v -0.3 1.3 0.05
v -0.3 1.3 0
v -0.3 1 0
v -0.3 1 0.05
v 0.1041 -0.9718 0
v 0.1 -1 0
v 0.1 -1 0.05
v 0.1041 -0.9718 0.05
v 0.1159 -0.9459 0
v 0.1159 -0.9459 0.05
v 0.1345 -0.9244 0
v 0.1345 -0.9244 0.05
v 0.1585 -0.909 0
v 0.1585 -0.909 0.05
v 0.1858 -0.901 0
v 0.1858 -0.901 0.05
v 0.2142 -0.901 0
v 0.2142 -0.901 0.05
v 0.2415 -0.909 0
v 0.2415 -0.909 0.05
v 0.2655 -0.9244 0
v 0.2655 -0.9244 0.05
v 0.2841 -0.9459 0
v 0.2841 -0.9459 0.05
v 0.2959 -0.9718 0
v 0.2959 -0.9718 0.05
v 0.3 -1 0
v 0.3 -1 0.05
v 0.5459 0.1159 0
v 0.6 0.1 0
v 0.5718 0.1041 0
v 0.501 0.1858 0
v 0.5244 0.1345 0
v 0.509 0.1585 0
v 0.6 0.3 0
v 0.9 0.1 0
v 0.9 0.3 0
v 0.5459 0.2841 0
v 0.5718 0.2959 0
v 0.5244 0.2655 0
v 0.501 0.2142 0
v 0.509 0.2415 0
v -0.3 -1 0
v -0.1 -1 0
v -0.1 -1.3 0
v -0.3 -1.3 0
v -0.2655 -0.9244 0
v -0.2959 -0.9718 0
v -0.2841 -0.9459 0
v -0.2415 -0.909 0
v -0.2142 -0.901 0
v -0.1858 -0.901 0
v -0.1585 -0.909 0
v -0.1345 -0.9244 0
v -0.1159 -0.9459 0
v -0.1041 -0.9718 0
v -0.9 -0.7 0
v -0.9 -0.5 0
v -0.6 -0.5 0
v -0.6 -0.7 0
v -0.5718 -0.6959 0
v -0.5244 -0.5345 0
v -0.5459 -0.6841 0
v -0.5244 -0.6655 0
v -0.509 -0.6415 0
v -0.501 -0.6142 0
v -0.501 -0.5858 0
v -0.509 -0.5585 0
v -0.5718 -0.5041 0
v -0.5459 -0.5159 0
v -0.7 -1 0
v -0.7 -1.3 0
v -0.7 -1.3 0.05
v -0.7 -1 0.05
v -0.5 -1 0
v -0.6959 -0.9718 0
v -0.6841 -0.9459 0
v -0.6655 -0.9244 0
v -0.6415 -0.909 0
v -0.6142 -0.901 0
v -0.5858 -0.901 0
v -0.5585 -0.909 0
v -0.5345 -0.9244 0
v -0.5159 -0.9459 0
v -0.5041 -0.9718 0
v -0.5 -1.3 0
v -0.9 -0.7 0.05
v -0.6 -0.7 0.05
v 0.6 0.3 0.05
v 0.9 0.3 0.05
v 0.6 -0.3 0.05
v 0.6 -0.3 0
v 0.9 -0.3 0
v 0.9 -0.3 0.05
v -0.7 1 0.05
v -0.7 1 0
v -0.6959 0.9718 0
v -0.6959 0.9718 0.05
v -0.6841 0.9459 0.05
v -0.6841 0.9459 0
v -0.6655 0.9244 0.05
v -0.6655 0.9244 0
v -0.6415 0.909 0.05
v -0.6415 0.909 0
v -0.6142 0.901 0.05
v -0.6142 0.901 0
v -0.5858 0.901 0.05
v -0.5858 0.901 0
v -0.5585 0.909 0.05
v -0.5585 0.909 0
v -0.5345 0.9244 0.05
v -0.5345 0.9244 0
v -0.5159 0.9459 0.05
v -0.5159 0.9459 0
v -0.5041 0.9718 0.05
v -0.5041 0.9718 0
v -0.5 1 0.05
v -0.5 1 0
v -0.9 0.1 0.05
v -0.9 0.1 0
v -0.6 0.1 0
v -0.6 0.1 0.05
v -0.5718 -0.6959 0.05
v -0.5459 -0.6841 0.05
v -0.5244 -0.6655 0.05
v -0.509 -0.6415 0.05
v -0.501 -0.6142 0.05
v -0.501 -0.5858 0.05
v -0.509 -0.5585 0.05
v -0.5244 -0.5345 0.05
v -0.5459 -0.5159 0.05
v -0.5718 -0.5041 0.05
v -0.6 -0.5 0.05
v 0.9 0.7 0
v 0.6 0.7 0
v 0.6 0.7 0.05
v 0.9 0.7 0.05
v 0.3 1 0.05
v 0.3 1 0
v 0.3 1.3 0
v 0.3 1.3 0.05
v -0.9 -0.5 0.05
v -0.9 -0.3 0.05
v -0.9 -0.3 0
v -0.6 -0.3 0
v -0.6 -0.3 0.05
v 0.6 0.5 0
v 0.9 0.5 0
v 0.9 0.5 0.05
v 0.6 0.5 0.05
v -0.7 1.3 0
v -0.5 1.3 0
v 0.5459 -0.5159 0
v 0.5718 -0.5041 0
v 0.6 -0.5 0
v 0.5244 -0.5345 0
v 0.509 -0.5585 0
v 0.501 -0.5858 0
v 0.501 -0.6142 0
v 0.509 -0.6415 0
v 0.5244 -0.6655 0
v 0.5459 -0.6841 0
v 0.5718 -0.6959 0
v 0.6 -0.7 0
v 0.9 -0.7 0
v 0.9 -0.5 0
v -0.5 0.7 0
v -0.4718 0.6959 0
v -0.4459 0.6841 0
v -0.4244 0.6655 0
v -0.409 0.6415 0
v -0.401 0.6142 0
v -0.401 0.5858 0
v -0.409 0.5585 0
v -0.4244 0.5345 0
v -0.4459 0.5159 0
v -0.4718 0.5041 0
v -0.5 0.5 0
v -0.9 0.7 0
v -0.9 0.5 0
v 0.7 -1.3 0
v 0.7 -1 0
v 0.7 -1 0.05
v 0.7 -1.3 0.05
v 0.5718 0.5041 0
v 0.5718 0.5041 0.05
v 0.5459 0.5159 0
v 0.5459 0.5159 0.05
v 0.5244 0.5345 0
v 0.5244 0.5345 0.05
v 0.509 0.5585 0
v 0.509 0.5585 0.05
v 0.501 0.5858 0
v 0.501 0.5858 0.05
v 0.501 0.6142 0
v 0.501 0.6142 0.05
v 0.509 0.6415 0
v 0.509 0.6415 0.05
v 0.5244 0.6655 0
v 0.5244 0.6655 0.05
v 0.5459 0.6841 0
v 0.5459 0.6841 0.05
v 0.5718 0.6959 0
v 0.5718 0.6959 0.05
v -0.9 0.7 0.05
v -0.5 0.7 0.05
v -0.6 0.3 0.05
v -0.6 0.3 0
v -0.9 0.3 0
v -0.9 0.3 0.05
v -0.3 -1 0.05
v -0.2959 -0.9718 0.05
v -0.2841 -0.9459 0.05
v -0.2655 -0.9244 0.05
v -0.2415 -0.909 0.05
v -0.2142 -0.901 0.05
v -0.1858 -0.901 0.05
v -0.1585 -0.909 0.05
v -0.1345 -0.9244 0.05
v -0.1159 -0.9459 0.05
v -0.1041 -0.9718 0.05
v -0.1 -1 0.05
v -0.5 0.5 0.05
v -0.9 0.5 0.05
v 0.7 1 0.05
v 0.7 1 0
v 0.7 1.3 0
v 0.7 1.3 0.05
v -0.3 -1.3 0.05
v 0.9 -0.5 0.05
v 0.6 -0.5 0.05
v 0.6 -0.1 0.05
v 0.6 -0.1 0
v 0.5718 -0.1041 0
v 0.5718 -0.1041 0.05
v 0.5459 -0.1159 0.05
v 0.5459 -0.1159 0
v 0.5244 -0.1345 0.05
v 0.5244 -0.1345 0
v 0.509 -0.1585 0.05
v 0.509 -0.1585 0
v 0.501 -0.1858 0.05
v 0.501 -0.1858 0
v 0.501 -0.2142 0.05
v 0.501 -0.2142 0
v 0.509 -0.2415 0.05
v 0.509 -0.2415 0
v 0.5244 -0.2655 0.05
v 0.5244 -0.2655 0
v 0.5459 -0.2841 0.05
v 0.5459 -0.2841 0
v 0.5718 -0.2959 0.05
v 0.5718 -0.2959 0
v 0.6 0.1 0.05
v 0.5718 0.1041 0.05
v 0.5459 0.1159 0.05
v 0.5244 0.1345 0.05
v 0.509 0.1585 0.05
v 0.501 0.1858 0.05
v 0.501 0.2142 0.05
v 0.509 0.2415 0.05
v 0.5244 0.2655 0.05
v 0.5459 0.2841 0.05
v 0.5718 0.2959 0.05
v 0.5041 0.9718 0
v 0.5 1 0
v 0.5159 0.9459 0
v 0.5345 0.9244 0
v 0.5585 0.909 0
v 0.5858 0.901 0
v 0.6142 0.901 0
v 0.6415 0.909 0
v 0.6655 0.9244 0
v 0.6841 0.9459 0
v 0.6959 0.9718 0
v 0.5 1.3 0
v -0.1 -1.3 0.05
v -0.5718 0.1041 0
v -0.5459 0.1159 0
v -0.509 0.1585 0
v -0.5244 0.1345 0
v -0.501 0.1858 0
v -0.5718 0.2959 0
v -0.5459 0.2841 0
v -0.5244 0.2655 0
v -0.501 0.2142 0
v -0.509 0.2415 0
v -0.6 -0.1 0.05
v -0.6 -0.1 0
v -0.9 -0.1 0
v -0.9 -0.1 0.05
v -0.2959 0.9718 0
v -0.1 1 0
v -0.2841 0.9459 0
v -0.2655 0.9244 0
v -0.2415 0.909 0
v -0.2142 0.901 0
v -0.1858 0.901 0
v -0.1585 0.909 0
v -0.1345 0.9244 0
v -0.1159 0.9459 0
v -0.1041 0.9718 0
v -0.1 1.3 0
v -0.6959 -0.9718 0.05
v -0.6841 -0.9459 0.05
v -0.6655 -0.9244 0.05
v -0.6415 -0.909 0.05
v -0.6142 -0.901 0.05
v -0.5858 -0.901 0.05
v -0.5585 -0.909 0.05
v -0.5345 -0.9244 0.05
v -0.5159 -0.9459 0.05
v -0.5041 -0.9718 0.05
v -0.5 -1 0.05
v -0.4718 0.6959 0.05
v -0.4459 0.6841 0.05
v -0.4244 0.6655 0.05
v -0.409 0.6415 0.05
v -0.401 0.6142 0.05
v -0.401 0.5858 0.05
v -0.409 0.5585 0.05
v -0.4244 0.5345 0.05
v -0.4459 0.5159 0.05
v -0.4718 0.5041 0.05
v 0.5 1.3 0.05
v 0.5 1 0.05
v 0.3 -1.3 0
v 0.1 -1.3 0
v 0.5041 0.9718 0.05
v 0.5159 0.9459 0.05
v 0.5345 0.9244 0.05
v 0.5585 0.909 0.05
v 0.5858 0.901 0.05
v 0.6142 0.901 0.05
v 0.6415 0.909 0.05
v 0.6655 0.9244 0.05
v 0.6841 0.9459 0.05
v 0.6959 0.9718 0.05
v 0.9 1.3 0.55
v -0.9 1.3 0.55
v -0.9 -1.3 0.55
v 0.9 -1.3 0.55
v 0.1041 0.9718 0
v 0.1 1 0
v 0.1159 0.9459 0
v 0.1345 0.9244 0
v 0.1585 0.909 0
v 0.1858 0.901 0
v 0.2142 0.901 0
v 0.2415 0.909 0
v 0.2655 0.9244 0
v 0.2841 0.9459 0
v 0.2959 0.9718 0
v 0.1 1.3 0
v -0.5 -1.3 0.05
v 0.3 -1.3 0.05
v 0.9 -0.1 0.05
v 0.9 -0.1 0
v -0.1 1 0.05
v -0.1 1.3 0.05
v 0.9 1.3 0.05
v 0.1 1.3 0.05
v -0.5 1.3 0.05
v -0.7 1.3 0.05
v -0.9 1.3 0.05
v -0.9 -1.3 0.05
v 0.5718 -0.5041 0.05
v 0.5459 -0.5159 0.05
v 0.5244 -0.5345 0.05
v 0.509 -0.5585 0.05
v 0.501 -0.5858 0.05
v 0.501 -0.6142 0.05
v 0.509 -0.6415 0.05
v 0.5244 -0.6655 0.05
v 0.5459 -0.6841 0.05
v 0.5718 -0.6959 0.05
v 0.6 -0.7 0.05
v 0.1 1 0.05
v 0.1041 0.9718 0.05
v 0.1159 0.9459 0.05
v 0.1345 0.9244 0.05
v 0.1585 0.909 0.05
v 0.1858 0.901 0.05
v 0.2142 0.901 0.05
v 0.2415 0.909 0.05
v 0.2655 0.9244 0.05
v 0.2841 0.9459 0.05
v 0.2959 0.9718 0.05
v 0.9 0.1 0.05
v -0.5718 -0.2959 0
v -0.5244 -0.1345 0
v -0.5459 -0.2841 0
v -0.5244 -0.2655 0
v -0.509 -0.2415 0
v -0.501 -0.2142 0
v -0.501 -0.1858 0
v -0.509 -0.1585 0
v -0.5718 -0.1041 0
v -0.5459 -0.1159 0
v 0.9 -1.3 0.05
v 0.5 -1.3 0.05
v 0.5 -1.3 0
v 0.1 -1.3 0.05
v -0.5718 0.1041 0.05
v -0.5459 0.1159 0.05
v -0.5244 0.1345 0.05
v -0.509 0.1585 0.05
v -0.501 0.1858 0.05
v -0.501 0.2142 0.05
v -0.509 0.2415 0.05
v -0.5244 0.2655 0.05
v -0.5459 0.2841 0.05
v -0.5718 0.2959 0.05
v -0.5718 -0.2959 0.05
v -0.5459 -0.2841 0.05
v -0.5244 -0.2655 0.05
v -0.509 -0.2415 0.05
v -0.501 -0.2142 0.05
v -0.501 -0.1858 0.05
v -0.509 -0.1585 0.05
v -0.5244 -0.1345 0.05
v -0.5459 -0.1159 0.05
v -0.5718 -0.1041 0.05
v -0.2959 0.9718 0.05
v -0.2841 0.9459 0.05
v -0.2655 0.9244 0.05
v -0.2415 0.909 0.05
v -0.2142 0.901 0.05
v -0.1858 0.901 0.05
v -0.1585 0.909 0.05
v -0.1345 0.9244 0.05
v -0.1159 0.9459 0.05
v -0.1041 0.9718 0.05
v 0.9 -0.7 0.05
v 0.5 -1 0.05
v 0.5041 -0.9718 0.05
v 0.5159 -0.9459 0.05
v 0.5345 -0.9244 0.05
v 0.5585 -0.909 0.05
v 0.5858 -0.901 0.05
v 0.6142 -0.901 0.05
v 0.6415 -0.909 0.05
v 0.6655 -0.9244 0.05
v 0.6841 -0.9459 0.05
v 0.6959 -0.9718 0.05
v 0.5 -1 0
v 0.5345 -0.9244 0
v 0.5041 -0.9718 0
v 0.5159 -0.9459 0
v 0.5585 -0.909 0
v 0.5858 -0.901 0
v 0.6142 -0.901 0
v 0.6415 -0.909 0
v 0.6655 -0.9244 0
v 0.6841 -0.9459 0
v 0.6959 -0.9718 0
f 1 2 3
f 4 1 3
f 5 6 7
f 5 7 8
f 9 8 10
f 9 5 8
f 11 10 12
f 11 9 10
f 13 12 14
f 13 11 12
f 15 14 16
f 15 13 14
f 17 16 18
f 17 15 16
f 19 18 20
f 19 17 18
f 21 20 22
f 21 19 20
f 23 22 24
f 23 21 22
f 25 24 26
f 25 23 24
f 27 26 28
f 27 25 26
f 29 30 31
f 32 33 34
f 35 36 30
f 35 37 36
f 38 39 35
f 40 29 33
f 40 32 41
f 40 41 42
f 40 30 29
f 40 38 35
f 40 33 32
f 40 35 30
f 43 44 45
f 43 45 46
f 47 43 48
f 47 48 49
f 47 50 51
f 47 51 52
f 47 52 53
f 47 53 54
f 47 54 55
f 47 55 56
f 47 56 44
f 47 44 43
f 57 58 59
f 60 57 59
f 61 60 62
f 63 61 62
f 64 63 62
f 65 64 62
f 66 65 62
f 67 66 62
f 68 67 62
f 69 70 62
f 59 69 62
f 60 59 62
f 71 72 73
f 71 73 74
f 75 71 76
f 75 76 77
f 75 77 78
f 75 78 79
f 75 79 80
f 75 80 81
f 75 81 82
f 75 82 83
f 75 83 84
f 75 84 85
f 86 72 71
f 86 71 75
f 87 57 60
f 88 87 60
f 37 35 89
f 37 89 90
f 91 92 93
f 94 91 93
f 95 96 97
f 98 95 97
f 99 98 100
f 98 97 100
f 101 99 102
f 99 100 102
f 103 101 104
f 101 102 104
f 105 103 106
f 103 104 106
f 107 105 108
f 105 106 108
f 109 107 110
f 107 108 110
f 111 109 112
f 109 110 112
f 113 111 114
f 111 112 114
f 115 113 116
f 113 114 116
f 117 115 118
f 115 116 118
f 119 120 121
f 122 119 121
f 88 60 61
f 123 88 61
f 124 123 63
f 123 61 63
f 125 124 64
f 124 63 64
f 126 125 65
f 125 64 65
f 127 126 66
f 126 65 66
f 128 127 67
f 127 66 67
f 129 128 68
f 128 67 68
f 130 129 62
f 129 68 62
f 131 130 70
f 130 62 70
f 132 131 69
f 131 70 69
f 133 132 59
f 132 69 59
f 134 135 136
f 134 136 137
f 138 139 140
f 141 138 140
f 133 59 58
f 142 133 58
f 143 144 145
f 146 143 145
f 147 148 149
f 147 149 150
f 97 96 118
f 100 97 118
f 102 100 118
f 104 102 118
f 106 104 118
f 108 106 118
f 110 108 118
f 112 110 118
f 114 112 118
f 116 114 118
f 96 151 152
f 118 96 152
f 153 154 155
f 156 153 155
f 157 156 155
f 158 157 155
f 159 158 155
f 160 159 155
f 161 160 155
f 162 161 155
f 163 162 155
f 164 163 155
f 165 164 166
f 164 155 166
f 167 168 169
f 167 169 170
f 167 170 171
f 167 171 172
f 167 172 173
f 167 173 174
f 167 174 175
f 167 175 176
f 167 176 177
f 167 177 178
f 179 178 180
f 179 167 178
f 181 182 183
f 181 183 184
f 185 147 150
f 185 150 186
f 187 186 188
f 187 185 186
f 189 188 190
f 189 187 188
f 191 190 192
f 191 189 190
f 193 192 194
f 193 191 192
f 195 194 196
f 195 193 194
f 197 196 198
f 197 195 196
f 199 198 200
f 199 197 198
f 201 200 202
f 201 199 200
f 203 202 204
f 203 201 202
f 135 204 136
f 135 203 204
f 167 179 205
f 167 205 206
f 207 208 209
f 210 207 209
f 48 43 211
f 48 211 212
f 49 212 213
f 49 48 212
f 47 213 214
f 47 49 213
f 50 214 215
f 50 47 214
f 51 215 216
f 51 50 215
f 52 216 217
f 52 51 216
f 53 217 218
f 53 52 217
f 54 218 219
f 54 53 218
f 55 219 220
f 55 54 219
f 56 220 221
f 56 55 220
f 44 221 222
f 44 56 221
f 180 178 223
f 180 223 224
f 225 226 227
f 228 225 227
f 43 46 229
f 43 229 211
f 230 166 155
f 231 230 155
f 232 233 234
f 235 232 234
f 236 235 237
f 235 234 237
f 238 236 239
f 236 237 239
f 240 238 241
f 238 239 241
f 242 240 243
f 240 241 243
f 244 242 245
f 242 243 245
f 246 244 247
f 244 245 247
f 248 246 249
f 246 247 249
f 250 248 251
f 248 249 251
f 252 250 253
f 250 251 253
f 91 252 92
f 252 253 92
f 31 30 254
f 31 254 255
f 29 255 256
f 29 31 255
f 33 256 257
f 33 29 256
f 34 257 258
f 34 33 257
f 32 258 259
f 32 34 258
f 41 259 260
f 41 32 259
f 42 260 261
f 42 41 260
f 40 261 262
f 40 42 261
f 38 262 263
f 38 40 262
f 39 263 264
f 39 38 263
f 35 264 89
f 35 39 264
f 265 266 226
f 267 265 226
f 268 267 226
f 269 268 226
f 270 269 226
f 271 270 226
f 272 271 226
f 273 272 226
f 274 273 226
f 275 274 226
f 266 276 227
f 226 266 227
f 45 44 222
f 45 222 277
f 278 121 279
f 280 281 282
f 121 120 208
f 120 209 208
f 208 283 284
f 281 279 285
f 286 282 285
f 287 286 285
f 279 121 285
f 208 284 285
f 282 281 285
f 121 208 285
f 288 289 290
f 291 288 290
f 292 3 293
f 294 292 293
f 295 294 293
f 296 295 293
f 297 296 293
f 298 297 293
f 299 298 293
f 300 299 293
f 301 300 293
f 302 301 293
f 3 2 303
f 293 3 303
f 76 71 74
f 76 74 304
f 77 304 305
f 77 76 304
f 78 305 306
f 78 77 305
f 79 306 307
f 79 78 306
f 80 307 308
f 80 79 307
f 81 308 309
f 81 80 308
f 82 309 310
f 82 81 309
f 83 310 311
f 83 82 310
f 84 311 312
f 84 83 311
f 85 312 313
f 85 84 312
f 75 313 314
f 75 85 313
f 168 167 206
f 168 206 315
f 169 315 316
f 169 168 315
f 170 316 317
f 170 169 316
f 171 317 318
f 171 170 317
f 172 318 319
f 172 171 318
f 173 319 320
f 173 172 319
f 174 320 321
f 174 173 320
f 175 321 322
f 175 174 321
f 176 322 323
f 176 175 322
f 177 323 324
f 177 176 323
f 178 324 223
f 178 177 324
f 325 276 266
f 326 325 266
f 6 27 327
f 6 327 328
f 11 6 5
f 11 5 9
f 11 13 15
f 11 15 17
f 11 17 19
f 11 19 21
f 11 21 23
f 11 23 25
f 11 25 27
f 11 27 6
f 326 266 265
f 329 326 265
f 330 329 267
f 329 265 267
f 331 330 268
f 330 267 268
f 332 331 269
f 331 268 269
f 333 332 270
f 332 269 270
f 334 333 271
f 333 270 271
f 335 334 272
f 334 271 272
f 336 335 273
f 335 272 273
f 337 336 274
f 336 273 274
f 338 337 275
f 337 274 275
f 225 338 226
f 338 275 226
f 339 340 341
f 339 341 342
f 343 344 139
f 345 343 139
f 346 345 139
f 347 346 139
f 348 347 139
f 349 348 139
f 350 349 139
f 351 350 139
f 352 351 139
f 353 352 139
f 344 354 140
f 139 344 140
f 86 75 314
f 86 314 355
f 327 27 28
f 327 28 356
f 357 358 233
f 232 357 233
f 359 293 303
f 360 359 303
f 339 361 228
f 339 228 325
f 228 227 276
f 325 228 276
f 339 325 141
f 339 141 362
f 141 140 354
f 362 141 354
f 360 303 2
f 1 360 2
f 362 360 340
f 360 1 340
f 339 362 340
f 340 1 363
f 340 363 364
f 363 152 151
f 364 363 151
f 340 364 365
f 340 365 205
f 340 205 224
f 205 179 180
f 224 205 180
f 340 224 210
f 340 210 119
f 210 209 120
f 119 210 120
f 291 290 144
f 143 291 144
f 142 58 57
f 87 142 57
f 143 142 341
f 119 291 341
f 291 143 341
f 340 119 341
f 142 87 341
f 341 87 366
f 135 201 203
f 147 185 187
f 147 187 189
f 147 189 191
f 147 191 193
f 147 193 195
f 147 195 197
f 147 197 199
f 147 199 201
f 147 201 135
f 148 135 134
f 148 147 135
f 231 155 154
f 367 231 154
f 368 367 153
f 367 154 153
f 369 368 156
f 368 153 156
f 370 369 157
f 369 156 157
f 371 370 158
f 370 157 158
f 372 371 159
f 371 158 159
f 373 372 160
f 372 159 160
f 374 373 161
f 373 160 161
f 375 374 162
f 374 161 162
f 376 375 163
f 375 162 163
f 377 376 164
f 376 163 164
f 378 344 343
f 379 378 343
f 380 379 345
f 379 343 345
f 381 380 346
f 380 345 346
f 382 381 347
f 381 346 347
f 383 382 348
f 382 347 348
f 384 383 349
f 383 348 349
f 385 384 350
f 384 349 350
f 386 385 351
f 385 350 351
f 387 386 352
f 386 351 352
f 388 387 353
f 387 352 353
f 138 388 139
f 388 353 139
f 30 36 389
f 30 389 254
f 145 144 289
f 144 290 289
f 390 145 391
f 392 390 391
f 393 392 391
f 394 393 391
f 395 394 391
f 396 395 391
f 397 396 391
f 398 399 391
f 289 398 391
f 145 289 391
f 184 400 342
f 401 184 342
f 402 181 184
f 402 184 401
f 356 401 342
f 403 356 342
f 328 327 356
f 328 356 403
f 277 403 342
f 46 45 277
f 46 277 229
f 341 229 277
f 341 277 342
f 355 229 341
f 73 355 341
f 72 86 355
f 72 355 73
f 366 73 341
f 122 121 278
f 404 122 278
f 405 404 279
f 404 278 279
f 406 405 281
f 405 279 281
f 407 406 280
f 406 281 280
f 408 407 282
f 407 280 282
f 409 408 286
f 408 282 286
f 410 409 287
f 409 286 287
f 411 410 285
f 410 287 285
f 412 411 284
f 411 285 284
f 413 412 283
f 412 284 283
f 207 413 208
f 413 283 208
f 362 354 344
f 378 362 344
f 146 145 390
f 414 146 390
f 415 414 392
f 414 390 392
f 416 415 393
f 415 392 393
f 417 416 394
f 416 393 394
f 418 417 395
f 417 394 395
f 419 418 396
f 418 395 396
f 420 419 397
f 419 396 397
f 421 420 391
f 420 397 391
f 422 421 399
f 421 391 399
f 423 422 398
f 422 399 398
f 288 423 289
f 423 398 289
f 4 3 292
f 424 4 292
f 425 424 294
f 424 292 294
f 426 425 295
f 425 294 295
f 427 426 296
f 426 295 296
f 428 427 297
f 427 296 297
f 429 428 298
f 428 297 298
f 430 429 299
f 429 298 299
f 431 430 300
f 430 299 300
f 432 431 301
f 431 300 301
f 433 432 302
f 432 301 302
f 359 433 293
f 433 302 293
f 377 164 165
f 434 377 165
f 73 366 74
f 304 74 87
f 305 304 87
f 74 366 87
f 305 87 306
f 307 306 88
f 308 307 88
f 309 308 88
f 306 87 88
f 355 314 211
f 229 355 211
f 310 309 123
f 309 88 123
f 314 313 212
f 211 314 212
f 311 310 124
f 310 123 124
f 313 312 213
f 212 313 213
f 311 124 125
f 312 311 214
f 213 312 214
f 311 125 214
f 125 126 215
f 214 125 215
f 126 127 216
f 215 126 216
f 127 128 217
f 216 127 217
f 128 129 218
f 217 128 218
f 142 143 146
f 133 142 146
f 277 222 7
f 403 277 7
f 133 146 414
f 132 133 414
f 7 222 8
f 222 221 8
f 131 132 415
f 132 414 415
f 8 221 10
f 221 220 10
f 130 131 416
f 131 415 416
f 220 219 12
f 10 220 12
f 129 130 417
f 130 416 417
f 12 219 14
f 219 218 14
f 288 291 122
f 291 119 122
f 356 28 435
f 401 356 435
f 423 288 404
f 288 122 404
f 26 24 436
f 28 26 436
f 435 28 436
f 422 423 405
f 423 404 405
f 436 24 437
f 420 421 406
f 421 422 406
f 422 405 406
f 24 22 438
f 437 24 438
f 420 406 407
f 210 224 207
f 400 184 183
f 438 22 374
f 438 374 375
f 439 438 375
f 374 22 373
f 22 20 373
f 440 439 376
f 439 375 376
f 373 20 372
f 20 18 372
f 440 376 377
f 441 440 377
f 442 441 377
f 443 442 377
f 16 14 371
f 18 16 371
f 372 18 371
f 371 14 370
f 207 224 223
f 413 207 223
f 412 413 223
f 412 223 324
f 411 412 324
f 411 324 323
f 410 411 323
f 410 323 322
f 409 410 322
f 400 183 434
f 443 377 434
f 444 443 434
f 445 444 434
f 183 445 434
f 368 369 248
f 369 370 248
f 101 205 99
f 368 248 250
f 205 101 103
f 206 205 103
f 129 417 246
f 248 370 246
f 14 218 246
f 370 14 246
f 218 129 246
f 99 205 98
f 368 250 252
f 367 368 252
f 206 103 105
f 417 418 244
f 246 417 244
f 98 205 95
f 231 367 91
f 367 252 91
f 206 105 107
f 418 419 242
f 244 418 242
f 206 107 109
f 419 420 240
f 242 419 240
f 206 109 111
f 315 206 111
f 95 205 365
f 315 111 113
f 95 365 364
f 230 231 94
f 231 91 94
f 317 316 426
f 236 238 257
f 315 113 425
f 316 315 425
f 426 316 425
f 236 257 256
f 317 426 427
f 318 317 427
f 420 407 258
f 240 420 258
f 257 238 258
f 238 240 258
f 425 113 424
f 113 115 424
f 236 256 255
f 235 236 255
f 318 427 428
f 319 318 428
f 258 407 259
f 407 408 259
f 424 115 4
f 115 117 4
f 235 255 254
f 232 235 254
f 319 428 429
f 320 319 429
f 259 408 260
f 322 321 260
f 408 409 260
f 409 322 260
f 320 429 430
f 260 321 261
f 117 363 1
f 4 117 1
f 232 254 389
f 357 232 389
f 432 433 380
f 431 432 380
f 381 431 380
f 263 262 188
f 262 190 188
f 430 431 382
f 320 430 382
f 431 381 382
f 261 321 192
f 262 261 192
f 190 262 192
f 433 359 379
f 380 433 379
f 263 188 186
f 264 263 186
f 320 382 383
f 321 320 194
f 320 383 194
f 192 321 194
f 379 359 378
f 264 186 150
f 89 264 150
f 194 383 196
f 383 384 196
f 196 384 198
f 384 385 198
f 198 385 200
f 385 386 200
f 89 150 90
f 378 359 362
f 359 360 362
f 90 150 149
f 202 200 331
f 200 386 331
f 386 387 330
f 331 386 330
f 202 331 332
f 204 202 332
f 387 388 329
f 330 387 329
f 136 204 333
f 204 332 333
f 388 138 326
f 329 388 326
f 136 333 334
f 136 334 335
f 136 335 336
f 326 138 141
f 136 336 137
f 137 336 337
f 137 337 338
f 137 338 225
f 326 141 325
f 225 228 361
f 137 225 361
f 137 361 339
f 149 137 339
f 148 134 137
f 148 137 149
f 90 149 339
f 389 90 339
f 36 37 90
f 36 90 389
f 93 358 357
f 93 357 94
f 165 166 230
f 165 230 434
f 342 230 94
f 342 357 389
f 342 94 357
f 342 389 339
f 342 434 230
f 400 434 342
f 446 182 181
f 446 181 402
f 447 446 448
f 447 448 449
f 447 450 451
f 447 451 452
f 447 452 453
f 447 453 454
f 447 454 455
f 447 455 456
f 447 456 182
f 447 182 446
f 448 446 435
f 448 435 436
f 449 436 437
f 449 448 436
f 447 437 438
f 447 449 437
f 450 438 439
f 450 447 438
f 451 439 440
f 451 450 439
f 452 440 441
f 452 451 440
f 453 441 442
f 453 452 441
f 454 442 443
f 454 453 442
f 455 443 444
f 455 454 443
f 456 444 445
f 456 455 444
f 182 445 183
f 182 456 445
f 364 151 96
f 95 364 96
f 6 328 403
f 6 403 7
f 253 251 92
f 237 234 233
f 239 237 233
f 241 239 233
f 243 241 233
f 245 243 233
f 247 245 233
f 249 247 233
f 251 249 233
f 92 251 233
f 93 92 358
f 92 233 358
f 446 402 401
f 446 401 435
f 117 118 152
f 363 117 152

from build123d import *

# Parameters (mm, degrees)
BOSS_EXTRUDE1_START    = 0.05
SKETCH1_W              = 1.8
SKETCH1_H              = 2.6
BOSS_EXTRUDE1_DEPTH    = 0.5
BOSS_EXTRUDE2_DEPTH    = 0.15
BOSS_EXTRUDE3_DEPTH    = 0.15
BOSS_EXTRUDE4_DEPTH    = 0.15
LPATTERN5_COPY_1_DEPTH = 0.15
LPATTERN5_COPY_2_DEPTH = 0.15
LPATTERN6_COUNT        = 4
LPATTERN6_PITCH        = 0.4
LPATTERN6_COPY_1_DEPTH = 0.15
LPATTERN6_COPY_2_DEPTH = 0.15
LPATTERN6_COPY_3_DEPTH = 0.15
LPATTERN7_DEPTH        = 0.05


# Read off the part's stored shape, not the designer's step: LPattern7
with BuildPart() as part:
    # Sketch1 → Boss-Extrude1 (new body)
    with BuildSketch(Plane.XY.offset(BOSS_EXTRUDE1_START)):
        Rectangle(SKETCH1_W, SKETCH1_H)
    extrude(amount=BOSS_EXTRUDE1_DEPTH)

    # Sketch2 → Boss-Extrude2 (add)
    with BuildSketch(Plane.XY):
        with BuildLine():
            Line((-0.9, 0.7), (-0.5, 0.7))
            ThreePointArc((-0.5, 0.7), (-0.4, 0.6), (-0.5, 0.5))
            Line((-0.5, 0.5), (-0.9, 0.5))
            Line((-0.9, 0.5), (-0.9, 0.7))
        make_face()
    extrude(amount=BOSS_EXTRUDE2_DEPTH)

    # Sketch3 → Boss-Extrude3 (add)
    with BuildSketch(Plane.XY):
        with BuildLine():
            Line((-0.7, 1.3), (-0.7, 1))
            ThreePointArc((-0.7, 1), (-0.6, 0.9), (-0.5, 1))
            Line((-0.5, 1), (-0.5, 1.3))
            Line((-0.5, 1.3), (-0.7, 1.3))
        make_face()
    boss_extrude3 = extrude(amount=BOSS_EXTRUDE3_DEPTH)

    # Sketch3<3> → Boss-Extrude4 (add)
    with BuildSketch(Plane.XY):
        with BuildLine():
            Line((-0.9, 0.1), (-0.6, 0.1))
            ThreePointArc((-0.6, 0.1), (-0.5, 0.2), (-0.6, 0.3))
            Line((-0.6, 0.3), (-0.9, 0.3))
            Line((-0.9, 0.3), (-0.9, 0.1))
        make_face()
    boss_extrude4 = extrude(amount=BOSS_EXTRUDE4_DEPTH)

    # Mirror8: Boss-Extrude4 across plane
    add(boss_extrude4.mirror(Plane(origin=(0, 0, 0), x_dir=(0, 0, 1), z_dir=(1, 0, 0))))

    # Mirror9: Boss-Extrude3 across plane
    add(boss_extrude3.mirror(Plane.ZX))

    # LPattern5 copy 1 sketch → LPattern5 copy 1 (add)
    with BuildSketch(Plane(origin=(0, 0.4, 0), x_dir=(-1, 0, 0), z_dir=(0, 0, 1))):
        with BuildLine():
            Line((-0.9, -0.1), (-0.6, -0.1))
            ThreePointArc((-0.6, -0.1), (-0.5, -0.2), (-0.6, -0.3))
            Line((-0.6, -0.3), (-0.9, -0.3))
            Line((-0.9, -0.3), (-0.9, -0.1))
        make_face()
    extrude(amount=LPATTERN5_COPY_1_DEPTH)

    # LPattern5 copy 2 sketch → LPattern5 copy 2 (add)
    with BuildSketch(Plane(origin=(0, 0.4, 0), x_dir=(1, 0, 0), z_dir=(0, 0, 1))):
        with BuildLine():
            Line((-0.9, 0.1), (-0.6, 0.1))
            ThreePointArc((-0.6, 0.1), (-0.5, 0.2), (-0.6, 0.3))
            Line((-0.6, 0.3), (-0.9, 0.3))
            Line((-0.9, 0.3), (-0.9, 0.1))
        make_face()
    extrude(amount=LPATTERN5_COPY_2_DEPTH)

    # LPattern6: Boss-Extrude3 ×4
    with Locations(*[(i * LPATTERN6_PITCH, 0, 0) for i in range(1, LPATTERN6_COUNT)]):
        add(boss_extrude3)

    # LPattern6 copy 1 sketch → LPattern6 copy 1 (add)
    with BuildSketch(Plane(origin=(0.4, 0, 0), x_dir=(1, 0, 0), z_dir=(0, 0, 1))):
        with BuildLine():
            Line((-0.7, -1.3), (-0.7, -1))
            ThreePointArc((-0.7, -1), (-0.6, -0.9), (-0.5, -1))
            Line((-0.5, -1), (-0.5, -1.3))
            Line((-0.5, -1.3), (-0.7, -1.3))
        make_face()
    extrude(amount=LPATTERN6_COPY_1_DEPTH)

    # LPattern6 copy 2 sketch → LPattern6 copy 2 (add)
    with BuildSketch(Plane(origin=(0.8, 0, 0), x_dir=(1, 0, 0), z_dir=(0, 0, 1))):
        with BuildLine():
            Line((-0.7, -1.3), (-0.7, -1))
            ThreePointArc((-0.7, -1), (-0.6, -0.9), (-0.5, -1))
            Line((-0.5, -1), (-0.5, -1.3))
            Line((-0.5, -1.3), (-0.7, -1.3))
        make_face()
    extrude(amount=LPATTERN6_COPY_2_DEPTH)

    # LPattern6 copy 3 sketch → LPattern6 copy 3 (add)
    with BuildSketch(Plane(origin=(1.2, 0, 0), x_dir=(1, 0, 0), z_dir=(0, 0, 1))):
        with BuildLine():
            Line((-0.7, -1.3), (-0.7, -1))
            ThreePointArc((-0.7, -1), (-0.6, -0.9), (-0.5, -1))
            Line((-0.5, -1), (-0.5, -1.3))
            Line((-0.5, -1.3), (-0.7, -1.3))
        make_face()
    extrude(amount=LPATTERN6_COPY_3_DEPTH)

    # LPattern7 outline → LPattern7 (add)
    with BuildSketch(Plane.XY):
        with BuildLine():
            ThreePointArc((0.6, -0.1), (0.5, -0.2), (0.6, -0.3))
            Line((0.6, -0.3), (0.9, -0.3))
            Line((0.9, -0.3), (0.9, -0.1))
            Line((0.9, -0.1), (0.6, -0.1))
        make_face()
        with BuildLine():
            Line((0.9, -0.7), (0.9, -0.5))
            Line((0.9, -0.5), (0.6, -0.5))
            ThreePointArc((0.6, -0.5), (0.5, -0.6), (0.6, -0.7))
            Line((0.6, -0.7), (0.9, -0.7))
        make_face()
        with BuildLine():
            Line((-0.6, -0.5), (-0.9, -0.5))
            Line((-0.9, -0.5), (-0.9, -0.7))
            Line((-0.9, -0.7), (-0.6, -0.7))
            ThreePointArc((-0.6, -0.7), (-0.5, -0.6), (-0.6, -0.5))
        make_face()
        with BuildLine():
            Line((-0.9, -0.3), (-0.6, -0.3))
            ThreePointArc((-0.6, -0.3), (-0.5, -0.2), (-0.6, -0.1))
            Line((-0.6, -0.1), (-0.9, -0.1))
            Line((-0.9, -0.1), (-0.9, -0.3))
        make_face()
    extrude(amount=LPATTERN7_DEPTH)


solid = part.part
